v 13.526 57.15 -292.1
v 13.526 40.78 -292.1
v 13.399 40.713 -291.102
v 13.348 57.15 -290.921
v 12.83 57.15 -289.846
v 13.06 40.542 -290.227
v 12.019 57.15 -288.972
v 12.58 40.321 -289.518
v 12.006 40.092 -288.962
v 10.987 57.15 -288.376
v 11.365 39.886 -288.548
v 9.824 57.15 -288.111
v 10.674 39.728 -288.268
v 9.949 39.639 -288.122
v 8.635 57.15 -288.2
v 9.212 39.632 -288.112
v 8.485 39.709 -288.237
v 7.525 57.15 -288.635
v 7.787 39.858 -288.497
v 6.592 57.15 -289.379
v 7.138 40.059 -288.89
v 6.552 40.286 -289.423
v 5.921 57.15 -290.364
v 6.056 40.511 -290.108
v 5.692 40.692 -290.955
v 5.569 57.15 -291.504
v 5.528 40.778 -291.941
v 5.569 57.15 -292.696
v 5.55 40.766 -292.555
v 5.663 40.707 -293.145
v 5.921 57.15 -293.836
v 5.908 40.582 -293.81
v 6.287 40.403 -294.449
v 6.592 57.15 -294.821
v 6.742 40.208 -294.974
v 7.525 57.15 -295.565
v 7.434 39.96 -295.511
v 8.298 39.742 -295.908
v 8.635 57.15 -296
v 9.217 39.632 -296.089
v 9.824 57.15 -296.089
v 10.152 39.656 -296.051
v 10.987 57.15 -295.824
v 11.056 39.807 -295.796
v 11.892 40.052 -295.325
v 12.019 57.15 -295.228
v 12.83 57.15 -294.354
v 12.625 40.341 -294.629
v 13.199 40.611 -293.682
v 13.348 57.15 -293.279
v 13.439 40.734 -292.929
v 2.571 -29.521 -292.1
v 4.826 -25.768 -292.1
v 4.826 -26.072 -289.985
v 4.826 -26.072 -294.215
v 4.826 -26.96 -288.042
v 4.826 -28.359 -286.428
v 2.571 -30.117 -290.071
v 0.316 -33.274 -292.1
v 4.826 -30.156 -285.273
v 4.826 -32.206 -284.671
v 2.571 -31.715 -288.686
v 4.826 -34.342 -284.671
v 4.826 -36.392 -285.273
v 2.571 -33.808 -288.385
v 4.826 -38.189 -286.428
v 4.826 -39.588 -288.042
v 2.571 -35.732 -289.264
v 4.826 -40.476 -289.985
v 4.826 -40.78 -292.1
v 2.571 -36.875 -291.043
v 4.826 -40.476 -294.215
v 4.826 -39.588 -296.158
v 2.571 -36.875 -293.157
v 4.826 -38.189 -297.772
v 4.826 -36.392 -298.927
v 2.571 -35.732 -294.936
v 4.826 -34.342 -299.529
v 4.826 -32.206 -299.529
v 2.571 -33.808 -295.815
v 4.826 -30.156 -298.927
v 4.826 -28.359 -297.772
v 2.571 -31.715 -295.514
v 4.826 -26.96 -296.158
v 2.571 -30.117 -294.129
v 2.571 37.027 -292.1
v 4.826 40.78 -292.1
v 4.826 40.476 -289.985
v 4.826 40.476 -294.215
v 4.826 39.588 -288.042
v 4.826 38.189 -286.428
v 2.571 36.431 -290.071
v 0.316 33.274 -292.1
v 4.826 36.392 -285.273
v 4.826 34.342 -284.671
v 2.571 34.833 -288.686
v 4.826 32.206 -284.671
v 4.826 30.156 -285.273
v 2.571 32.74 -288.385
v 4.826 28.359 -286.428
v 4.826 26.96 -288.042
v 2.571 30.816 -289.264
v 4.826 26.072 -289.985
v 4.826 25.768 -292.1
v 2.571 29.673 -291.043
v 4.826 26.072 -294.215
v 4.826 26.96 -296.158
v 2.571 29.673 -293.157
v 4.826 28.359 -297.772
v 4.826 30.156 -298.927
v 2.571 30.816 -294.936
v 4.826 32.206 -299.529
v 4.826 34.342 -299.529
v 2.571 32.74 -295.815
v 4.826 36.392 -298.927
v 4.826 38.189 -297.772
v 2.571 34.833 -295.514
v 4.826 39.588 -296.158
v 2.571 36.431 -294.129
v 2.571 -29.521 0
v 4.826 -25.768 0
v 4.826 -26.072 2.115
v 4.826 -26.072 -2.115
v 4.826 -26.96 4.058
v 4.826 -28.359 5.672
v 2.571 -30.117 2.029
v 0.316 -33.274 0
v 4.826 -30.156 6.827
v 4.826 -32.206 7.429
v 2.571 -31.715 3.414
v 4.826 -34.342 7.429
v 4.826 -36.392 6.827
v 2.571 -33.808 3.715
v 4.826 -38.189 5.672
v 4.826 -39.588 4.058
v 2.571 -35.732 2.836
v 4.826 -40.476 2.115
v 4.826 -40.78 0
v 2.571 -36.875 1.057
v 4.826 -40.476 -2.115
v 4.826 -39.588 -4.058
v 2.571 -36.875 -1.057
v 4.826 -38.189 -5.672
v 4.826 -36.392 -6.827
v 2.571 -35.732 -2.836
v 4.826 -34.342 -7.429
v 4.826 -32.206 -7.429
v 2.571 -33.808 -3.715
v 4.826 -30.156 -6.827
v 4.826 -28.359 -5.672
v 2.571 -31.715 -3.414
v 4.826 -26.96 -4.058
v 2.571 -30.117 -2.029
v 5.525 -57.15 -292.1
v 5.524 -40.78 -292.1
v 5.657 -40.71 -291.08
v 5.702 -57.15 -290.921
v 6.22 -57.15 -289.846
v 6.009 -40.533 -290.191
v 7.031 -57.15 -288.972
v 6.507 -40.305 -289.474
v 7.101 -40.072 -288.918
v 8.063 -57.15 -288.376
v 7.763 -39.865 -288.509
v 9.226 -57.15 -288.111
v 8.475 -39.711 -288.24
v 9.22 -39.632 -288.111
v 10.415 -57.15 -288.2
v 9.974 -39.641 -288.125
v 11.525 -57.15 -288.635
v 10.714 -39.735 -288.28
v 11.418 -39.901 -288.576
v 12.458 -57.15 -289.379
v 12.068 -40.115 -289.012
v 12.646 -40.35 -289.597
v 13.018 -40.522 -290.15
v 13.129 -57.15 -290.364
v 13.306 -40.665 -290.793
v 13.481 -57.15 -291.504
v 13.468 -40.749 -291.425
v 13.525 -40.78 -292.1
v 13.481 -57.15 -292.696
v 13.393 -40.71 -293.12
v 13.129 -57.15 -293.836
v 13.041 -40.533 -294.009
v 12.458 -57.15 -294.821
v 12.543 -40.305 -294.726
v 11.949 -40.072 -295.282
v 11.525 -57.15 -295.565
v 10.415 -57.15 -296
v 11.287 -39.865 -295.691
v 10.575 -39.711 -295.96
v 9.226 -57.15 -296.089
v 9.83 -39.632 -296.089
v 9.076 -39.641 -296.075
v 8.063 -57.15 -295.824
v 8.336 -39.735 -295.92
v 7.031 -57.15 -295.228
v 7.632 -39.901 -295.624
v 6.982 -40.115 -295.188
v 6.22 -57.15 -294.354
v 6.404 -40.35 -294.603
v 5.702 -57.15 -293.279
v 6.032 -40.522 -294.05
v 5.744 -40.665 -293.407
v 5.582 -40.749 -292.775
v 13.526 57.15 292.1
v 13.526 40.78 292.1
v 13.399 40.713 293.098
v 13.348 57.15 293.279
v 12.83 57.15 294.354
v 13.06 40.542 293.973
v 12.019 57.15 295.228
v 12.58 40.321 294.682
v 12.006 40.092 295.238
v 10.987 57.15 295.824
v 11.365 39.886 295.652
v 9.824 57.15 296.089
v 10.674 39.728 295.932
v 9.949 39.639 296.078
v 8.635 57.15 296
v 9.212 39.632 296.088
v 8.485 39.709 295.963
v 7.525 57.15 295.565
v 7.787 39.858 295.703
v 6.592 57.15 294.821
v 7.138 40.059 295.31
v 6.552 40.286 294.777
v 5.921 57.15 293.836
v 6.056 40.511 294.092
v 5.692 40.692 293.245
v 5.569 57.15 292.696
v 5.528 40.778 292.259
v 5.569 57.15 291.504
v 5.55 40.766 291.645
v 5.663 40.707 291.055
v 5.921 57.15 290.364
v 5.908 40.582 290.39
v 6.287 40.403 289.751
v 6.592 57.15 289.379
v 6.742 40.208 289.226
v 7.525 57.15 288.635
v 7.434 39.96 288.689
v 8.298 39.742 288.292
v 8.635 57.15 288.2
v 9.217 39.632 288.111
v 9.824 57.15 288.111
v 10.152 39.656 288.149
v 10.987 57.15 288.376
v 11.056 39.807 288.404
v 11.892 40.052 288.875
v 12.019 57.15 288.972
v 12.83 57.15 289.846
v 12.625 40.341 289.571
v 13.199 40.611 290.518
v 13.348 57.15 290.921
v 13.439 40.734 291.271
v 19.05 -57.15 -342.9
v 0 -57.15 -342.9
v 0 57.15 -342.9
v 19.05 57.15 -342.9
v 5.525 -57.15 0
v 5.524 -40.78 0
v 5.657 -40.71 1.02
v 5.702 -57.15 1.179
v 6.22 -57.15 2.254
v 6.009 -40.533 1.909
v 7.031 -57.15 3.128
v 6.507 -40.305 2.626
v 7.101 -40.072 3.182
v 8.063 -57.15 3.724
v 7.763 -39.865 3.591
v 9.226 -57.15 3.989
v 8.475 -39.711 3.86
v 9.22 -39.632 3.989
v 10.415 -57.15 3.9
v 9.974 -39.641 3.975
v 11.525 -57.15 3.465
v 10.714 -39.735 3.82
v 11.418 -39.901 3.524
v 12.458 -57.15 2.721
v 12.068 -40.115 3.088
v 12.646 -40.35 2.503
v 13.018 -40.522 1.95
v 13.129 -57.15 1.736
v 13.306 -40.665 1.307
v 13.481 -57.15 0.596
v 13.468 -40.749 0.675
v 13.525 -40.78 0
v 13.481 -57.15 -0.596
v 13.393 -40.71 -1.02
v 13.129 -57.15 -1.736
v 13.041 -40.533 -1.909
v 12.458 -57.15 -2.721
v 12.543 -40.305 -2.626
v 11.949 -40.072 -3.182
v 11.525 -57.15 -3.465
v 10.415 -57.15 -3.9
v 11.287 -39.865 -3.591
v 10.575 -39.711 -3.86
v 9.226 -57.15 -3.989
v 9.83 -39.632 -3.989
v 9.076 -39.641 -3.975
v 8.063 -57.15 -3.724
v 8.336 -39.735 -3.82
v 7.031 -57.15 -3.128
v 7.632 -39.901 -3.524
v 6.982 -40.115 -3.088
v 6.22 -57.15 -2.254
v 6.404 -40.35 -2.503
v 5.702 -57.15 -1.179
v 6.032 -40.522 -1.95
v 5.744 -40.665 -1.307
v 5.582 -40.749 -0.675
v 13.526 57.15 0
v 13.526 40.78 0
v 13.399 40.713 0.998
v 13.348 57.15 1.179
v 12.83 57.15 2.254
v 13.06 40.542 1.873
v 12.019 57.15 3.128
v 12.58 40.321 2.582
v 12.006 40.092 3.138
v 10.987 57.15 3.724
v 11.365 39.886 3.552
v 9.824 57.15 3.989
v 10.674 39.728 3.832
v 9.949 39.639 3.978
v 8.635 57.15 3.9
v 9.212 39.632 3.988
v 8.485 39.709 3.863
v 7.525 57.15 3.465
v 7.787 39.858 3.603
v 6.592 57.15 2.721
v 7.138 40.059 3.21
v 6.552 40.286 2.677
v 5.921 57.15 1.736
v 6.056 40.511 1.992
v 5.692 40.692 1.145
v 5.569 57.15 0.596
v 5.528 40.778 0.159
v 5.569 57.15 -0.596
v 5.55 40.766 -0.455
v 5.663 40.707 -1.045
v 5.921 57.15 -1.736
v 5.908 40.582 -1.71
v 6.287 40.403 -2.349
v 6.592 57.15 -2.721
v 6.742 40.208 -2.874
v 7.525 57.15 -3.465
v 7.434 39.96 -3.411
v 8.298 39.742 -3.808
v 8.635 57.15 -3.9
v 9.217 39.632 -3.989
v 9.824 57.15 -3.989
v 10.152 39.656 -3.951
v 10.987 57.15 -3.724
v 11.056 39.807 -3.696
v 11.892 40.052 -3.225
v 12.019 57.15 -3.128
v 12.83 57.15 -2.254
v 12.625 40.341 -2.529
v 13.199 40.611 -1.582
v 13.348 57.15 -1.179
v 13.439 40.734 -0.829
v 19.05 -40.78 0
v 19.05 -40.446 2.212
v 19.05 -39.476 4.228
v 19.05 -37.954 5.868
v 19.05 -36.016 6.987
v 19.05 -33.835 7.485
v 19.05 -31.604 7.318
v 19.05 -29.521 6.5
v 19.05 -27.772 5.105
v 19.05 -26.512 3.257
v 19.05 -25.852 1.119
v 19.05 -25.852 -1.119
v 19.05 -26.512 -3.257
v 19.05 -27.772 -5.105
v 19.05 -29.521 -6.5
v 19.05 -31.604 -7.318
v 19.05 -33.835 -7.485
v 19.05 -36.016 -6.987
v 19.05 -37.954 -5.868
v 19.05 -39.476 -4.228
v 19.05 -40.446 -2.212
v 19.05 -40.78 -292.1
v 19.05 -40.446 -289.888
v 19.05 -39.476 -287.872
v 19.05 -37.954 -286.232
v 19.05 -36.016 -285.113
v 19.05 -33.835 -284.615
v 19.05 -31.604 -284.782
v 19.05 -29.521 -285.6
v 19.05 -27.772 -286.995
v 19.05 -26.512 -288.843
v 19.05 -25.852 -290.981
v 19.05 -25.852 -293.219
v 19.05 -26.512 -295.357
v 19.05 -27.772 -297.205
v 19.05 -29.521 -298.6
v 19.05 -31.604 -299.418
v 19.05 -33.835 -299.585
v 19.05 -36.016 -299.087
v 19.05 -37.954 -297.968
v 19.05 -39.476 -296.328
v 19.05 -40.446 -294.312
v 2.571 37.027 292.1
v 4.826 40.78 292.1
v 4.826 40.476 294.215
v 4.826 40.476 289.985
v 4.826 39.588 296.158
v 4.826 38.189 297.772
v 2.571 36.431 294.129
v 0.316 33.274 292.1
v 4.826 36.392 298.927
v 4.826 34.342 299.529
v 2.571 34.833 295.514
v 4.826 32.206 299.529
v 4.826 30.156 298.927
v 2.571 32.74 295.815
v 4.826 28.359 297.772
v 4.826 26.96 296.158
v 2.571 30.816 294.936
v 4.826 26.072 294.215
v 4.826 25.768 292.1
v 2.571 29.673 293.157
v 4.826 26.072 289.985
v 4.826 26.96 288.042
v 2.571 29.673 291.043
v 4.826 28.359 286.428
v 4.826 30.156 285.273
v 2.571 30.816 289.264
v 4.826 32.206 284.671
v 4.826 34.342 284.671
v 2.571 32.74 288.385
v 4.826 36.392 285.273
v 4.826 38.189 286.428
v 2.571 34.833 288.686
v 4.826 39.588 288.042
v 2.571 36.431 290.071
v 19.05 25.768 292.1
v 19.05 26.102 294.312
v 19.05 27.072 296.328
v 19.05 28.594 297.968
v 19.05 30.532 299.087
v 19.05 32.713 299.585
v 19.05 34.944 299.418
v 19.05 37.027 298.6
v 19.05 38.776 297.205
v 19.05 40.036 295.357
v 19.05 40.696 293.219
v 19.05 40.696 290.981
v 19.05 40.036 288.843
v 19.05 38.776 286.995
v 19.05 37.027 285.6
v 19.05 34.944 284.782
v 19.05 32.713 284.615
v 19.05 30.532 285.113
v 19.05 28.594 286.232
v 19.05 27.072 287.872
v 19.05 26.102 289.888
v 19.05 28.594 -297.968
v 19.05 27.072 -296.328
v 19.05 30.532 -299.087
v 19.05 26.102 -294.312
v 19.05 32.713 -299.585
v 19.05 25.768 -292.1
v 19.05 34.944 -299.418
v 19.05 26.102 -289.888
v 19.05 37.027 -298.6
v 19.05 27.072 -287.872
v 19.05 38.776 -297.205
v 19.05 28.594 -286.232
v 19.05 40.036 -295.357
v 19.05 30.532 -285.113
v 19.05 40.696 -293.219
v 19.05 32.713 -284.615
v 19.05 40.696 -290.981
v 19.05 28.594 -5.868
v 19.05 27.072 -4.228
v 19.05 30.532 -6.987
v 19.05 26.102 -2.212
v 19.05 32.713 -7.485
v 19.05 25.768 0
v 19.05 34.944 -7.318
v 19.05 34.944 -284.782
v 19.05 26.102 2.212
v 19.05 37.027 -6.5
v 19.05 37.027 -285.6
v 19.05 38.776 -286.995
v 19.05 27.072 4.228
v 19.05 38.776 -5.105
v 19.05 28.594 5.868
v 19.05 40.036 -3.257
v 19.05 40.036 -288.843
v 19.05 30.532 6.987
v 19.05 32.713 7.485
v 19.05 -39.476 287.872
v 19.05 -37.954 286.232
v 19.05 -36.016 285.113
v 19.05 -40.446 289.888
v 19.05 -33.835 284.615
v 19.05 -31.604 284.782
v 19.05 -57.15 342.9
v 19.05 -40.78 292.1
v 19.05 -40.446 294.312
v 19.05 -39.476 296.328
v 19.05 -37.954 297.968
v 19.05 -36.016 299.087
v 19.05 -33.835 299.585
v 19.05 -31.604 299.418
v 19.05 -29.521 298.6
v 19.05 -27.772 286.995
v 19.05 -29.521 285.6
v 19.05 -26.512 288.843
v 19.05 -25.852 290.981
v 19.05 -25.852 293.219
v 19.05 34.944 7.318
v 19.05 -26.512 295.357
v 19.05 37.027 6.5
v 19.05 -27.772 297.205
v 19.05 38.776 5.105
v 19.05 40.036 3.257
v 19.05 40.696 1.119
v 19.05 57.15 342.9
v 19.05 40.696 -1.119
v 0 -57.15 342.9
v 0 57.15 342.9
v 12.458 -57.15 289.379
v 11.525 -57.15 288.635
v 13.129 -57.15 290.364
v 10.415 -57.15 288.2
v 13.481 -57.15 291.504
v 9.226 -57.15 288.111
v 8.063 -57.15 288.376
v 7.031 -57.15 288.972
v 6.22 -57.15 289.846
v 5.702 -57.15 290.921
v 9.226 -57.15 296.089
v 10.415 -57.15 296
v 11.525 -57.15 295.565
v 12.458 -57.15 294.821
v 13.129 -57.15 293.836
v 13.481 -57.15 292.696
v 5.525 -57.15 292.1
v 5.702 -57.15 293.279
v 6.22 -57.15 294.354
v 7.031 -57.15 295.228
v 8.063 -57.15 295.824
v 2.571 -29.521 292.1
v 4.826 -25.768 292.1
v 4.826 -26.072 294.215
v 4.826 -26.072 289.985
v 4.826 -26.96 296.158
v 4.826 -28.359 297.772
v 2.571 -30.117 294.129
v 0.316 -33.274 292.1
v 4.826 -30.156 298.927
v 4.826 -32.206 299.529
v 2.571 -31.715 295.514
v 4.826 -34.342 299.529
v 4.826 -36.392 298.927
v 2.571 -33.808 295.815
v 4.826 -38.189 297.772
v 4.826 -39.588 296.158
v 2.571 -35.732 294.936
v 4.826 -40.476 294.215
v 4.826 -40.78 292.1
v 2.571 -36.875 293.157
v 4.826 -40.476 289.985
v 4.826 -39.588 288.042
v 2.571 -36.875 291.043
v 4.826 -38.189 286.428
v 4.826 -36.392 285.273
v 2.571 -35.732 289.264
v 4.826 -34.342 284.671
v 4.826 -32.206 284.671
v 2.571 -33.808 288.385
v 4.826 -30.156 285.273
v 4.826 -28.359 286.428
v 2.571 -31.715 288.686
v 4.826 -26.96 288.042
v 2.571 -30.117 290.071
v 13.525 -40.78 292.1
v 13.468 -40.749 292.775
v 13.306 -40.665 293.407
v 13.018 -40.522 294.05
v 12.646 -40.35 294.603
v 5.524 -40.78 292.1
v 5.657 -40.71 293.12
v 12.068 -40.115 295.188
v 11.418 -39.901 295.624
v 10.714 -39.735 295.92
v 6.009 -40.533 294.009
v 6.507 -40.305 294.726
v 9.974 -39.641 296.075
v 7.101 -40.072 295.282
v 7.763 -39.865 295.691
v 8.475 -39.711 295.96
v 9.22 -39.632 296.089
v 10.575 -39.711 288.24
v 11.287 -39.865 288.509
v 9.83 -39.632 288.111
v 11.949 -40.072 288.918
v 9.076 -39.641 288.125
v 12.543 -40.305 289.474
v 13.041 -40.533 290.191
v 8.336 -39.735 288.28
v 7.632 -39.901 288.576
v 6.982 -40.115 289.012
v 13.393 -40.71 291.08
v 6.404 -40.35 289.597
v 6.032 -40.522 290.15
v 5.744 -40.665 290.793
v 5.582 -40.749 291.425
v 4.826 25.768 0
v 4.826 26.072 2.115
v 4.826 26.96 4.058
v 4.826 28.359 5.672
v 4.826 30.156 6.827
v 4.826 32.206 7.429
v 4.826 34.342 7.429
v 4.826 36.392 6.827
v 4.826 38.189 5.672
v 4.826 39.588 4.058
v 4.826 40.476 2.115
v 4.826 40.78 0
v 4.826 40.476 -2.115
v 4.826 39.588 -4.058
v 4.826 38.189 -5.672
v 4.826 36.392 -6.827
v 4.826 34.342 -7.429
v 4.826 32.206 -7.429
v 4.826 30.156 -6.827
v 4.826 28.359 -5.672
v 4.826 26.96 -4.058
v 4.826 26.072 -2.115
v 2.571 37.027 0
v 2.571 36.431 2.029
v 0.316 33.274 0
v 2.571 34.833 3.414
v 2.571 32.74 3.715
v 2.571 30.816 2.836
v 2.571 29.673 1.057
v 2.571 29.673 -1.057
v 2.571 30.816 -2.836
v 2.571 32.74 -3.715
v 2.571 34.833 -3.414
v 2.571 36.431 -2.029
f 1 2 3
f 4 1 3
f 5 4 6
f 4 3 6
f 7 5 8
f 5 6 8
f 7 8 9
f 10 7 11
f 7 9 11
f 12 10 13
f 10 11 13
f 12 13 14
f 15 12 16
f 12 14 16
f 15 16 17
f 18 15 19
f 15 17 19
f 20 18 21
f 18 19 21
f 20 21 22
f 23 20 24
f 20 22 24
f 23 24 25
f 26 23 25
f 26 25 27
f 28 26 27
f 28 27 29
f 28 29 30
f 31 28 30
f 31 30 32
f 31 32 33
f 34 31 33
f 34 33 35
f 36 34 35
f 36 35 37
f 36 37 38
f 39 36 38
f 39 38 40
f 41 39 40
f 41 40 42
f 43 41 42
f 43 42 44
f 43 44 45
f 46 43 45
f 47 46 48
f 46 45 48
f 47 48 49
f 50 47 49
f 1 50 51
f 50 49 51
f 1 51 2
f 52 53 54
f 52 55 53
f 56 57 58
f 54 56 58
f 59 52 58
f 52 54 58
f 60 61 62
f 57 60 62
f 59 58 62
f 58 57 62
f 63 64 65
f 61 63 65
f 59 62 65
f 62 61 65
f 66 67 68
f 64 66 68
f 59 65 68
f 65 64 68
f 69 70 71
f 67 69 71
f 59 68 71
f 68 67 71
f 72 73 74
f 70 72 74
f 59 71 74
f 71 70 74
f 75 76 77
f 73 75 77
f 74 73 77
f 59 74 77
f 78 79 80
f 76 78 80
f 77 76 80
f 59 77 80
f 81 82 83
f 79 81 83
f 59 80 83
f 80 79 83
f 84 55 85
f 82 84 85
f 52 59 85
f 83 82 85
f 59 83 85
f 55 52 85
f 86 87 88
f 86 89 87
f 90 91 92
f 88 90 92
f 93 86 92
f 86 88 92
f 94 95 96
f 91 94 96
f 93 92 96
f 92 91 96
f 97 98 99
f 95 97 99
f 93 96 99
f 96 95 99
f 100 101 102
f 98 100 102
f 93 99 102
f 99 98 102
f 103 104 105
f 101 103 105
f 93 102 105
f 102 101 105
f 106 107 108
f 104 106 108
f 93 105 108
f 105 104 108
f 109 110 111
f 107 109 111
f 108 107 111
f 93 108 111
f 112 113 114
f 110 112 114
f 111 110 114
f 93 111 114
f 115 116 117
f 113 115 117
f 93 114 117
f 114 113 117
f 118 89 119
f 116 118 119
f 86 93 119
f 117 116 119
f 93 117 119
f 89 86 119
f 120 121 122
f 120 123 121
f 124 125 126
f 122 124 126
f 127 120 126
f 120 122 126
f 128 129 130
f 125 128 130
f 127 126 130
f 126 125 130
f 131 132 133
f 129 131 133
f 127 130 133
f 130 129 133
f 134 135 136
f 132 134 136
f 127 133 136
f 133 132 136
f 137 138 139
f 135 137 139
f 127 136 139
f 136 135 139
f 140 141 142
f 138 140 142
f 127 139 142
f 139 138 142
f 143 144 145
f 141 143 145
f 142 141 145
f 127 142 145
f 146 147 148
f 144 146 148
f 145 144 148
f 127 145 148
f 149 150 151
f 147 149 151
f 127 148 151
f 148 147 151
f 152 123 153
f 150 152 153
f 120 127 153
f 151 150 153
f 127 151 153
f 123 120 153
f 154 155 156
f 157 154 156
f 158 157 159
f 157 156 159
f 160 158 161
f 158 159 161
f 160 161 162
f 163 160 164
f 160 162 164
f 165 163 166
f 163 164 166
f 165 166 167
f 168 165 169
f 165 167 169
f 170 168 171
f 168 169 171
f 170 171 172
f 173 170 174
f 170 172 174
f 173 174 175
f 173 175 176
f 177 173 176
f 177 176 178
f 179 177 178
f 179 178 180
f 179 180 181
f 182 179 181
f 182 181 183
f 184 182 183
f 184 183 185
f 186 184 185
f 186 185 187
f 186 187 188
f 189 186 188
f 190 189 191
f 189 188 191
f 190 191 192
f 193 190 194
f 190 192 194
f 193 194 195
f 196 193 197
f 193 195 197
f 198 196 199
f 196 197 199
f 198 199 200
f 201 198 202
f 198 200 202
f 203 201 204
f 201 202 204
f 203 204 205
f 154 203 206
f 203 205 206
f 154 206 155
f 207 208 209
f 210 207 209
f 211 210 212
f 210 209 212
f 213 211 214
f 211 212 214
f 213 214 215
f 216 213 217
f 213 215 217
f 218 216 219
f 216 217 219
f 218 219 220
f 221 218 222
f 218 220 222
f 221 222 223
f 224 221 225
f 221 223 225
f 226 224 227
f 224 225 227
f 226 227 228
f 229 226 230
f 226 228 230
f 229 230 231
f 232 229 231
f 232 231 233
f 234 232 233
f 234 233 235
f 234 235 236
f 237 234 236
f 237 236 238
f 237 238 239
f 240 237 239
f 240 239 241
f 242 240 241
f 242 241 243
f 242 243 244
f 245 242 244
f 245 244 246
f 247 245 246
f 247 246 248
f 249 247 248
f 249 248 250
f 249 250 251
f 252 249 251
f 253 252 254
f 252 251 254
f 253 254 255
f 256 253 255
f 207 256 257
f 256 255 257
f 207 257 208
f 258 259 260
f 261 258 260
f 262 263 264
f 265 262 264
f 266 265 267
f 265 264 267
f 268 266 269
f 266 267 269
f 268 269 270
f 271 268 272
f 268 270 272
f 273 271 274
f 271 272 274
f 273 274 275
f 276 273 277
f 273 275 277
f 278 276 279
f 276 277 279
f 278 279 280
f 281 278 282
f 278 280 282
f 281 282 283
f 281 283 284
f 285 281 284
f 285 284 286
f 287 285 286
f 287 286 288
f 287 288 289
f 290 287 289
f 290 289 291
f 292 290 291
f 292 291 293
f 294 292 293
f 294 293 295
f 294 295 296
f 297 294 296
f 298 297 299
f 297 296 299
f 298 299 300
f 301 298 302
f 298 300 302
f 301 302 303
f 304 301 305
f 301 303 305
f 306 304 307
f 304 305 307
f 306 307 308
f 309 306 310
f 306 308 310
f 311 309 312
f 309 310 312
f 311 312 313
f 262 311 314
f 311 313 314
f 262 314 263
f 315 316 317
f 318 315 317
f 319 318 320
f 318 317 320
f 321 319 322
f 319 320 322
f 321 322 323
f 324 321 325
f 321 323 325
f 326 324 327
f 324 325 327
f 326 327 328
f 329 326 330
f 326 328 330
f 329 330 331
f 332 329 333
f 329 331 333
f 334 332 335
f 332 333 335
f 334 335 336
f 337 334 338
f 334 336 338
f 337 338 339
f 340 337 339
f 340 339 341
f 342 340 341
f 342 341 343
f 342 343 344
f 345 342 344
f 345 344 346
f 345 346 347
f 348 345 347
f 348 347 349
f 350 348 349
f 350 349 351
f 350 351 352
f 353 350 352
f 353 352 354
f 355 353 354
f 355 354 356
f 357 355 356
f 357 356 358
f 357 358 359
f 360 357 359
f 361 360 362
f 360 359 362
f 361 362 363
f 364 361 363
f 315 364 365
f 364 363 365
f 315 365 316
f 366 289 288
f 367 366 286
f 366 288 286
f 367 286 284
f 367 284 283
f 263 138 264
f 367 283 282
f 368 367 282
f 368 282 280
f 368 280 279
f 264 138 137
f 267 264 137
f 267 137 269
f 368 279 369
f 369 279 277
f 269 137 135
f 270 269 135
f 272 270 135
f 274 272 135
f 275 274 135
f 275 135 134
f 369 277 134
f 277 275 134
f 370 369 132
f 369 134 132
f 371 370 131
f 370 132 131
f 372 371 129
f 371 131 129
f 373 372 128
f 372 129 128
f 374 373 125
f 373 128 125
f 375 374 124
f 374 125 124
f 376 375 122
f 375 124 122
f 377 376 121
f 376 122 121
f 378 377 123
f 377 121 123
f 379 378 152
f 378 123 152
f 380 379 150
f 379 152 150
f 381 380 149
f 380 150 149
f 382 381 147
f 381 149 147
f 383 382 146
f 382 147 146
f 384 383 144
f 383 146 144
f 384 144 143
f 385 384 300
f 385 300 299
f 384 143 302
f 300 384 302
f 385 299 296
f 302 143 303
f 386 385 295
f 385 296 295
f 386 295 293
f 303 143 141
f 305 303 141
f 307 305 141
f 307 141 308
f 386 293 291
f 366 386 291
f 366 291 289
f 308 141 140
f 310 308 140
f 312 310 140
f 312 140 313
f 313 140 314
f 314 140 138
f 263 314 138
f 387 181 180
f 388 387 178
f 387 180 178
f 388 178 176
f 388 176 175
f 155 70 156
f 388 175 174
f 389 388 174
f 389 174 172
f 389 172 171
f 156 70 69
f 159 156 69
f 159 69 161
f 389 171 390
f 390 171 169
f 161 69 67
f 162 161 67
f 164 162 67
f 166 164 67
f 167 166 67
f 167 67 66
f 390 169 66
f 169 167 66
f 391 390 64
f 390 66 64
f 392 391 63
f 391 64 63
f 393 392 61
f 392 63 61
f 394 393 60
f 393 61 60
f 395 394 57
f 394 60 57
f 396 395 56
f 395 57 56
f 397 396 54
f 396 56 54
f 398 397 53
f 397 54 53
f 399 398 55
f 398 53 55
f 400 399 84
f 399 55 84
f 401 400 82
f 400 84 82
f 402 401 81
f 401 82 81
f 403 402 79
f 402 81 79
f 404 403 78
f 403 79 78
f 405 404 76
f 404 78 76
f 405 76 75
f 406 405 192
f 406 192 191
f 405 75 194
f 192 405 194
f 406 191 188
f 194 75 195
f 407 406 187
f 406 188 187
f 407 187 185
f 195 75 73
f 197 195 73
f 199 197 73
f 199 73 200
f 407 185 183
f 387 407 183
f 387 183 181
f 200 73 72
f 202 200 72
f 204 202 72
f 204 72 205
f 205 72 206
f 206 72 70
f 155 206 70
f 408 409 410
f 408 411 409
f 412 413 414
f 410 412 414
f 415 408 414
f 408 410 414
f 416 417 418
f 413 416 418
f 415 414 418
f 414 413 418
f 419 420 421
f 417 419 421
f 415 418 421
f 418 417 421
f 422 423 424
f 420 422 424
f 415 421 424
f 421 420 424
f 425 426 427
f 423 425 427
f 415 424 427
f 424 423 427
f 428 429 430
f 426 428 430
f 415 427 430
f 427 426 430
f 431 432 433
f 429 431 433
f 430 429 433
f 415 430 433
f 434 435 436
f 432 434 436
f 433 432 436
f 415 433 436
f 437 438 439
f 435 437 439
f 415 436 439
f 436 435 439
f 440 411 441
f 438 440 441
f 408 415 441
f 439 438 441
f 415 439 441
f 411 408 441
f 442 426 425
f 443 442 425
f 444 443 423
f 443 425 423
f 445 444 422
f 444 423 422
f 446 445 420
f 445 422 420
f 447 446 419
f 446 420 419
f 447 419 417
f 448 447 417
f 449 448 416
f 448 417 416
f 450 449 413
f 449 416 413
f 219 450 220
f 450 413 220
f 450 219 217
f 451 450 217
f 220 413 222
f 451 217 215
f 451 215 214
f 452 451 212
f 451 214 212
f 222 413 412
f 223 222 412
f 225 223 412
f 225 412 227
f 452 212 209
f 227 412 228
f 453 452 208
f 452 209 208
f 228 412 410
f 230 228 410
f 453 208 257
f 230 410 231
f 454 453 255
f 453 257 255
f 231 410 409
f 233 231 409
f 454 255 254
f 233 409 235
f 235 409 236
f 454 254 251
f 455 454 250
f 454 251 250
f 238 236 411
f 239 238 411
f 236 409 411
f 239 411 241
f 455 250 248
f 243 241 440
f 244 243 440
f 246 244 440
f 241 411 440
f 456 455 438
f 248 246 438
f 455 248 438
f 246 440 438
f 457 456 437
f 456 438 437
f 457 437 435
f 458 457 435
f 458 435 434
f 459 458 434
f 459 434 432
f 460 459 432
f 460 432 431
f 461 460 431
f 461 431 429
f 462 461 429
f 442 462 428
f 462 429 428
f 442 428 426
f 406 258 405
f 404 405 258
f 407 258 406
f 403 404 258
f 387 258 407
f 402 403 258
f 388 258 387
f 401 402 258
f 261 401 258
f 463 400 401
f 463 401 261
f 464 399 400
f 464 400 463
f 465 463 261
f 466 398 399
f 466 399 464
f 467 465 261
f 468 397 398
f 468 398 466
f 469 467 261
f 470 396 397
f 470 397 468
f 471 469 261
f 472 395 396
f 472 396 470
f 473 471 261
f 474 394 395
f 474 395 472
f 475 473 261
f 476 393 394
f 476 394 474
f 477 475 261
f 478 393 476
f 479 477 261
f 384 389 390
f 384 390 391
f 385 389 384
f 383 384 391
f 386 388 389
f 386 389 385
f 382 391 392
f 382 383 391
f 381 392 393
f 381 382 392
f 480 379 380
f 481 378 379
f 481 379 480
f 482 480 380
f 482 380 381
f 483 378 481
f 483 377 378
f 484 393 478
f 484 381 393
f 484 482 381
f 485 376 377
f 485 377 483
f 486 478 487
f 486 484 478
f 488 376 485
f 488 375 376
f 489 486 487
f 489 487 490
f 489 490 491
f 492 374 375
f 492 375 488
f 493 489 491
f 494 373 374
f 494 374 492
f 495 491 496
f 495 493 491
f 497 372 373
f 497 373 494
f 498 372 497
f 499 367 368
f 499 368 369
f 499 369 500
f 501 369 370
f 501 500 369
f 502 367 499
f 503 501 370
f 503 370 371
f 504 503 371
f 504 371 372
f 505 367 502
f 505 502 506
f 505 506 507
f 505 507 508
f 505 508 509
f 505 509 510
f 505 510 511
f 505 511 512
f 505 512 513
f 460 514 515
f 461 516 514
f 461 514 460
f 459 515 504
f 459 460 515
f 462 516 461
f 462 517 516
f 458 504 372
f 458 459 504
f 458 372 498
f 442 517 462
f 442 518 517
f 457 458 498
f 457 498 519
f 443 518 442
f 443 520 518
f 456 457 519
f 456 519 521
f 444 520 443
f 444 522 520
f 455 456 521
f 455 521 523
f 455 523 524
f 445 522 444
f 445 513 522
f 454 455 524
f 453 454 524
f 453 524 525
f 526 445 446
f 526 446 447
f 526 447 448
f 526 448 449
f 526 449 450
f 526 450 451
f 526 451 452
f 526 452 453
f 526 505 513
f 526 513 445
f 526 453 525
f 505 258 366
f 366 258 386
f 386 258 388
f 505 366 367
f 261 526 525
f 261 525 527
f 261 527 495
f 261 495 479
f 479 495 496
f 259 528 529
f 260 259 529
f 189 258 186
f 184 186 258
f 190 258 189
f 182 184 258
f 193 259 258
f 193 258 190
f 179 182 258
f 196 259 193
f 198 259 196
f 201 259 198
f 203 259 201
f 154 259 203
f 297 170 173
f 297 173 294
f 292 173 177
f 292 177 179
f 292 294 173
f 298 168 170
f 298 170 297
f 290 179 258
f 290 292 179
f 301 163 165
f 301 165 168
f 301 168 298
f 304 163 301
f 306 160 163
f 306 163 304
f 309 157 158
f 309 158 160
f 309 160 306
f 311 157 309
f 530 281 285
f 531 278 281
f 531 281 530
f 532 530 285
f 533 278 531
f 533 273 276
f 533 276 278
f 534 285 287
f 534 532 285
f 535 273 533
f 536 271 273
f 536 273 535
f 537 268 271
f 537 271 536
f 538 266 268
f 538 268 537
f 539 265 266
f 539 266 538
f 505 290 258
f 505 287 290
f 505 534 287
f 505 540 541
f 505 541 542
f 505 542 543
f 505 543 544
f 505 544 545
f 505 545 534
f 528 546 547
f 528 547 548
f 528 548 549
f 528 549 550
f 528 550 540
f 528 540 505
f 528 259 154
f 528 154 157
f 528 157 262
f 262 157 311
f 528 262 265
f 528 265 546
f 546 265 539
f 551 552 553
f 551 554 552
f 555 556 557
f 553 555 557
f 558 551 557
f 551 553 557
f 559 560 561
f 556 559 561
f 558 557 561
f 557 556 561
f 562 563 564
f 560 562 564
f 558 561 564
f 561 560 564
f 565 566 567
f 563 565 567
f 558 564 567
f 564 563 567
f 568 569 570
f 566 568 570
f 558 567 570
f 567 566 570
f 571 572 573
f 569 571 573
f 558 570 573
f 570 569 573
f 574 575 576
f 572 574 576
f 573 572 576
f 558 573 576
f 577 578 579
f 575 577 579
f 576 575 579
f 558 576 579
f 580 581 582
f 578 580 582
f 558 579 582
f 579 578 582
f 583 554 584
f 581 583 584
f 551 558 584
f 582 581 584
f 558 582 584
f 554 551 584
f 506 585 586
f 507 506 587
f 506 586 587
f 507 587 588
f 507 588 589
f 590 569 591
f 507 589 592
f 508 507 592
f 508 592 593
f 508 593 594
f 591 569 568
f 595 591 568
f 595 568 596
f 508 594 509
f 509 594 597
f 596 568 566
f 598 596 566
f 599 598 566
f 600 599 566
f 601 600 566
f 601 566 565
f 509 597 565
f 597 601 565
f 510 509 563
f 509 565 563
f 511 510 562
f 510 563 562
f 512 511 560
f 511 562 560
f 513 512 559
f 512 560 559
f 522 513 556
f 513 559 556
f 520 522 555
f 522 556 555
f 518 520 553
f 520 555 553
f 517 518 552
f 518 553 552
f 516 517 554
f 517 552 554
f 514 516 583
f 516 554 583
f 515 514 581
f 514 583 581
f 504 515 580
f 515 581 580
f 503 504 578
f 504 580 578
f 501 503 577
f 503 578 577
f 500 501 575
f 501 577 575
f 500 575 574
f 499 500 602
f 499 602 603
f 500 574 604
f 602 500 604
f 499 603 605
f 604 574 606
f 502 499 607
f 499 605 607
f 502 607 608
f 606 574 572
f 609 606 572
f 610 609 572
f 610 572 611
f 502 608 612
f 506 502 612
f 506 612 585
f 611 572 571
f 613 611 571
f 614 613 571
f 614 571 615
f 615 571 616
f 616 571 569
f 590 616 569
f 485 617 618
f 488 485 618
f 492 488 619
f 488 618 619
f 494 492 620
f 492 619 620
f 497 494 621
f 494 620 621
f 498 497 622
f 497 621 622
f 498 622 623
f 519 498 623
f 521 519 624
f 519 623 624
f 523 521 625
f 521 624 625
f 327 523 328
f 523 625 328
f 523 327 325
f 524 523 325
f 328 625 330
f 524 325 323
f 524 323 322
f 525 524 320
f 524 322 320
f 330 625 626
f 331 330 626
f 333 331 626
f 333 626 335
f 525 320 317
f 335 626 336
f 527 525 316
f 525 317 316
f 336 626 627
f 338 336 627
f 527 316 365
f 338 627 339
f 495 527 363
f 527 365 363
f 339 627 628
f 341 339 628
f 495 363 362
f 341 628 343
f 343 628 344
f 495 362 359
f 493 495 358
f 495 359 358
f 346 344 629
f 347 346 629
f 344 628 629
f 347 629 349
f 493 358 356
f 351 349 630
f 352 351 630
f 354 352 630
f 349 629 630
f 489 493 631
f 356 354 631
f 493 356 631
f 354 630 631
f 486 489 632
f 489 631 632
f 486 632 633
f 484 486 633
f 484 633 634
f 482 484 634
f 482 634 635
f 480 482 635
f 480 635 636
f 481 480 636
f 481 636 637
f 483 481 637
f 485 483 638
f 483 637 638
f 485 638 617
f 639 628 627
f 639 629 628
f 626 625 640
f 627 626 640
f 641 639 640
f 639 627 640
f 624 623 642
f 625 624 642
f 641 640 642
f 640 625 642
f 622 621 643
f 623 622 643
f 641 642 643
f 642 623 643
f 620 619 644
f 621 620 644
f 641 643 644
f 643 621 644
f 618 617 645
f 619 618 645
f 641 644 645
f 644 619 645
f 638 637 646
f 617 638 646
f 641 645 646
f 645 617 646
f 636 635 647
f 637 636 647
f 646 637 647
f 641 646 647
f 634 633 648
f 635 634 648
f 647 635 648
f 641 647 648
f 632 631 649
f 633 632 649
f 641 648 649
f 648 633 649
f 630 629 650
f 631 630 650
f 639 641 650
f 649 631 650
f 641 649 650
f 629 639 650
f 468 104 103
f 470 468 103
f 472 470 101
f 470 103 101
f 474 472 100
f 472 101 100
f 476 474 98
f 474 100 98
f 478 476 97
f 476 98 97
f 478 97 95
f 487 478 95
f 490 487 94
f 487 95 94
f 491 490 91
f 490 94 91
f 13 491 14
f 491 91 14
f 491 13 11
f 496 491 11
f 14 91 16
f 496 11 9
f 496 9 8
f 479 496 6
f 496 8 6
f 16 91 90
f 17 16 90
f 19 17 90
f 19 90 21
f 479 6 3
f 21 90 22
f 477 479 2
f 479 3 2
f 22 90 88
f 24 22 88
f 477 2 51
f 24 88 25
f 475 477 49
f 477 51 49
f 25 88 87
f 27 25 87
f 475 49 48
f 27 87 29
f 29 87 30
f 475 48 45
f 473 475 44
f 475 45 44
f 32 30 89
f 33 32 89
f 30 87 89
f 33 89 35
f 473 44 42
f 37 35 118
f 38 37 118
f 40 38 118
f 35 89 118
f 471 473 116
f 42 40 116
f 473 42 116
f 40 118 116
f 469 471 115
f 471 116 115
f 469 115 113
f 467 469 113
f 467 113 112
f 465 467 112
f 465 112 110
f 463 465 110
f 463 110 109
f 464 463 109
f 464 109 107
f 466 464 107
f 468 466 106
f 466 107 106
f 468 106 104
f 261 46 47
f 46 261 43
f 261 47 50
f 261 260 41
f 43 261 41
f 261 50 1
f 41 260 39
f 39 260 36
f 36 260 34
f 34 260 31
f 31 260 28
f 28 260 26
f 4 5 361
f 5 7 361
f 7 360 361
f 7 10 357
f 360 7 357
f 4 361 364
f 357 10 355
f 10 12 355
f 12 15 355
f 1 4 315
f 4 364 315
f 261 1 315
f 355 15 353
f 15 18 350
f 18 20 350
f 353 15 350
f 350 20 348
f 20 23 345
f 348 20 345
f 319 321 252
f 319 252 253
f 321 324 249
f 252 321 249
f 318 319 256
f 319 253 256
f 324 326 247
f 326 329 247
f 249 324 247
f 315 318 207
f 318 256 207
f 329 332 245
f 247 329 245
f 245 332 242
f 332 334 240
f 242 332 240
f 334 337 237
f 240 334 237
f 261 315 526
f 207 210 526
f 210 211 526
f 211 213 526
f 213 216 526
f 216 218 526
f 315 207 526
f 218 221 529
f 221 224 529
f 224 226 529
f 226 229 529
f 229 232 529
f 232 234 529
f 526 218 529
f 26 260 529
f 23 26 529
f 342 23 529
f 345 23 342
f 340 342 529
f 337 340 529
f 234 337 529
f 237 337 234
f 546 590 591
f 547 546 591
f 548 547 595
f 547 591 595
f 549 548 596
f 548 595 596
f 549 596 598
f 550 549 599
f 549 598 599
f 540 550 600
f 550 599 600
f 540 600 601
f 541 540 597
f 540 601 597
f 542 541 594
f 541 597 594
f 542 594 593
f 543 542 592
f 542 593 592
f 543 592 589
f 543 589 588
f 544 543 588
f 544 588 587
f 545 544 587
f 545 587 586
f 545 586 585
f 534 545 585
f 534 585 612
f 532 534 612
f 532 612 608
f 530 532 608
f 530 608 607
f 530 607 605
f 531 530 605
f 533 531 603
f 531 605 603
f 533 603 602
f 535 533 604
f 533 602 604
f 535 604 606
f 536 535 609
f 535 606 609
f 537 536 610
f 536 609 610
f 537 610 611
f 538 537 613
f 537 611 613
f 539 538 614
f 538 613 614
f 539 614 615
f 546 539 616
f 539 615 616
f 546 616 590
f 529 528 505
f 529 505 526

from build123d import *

# Parameters (mm, degrees)
F0_W     = 114.3
F0_H     = 685.8
F1_DEPTH = 19.05
F3_D     = 15.0114
F3_DEPTH = 14.224
F3_TIP   = 4.5098795482
F5_D     = 8.001
F5_DEPTH = 25.4
F5_TIP   = 2.4037429064
F7_D     = 8.001
F7_DEPTH = 25.4
F7_TIP   = 2.4037429064


with BuildPart() as f1:
    # F0 (on Right) → F1 (new body)
    with BuildSketch(Plane.YZ):
        Rectangle(F0_W, F0_H)
    extrude(amount=F1_DEPTH)

    # F3
    with Locations(Plane.YZ.offset(19.05)):
        with Locations((-33.274, 292.1), (33.274, 292.1), (-33.274, 0), (33.274, 0), (33.274, -292.1), (-33.274, -292.1)):
            Hole(F3_D / 2, depth=F3_DEPTH)
            with Locations((0, 0, -(F3_DEPTH + F3_TIP / 2))):  # 118° drill point
                Cone(0, F3_D / 2, F3_TIP, mode=Mode.SUBTRACT)

    # F5
    with Locations(Plane(origin=(0, 57.15, 0), x_dir=(-1, 0, 0), z_dir=(0, 1, 0))):
        with Locations((-9.525, -292.1), (-9.525, 292.1), (-9.525, 0)):
            Hole(F5_D / 2, depth=F5_DEPTH)
            with Locations((0, 0, -(F5_DEPTH + F5_TIP / 2))):  # 118° drill point
                Cone(0, F5_D / 2, F5_TIP, mode=Mode.SUBTRACT)

    # F7
    with Locations(Plane.XZ.offset(57.15)):
        with Locations((9.525, 292.1), (9.525, 0), (9.525, -292.1)):
            Hole(F7_D / 2, depth=F7_DEPTH)
            with Locations((0, 0, -(F7_DEPTH + F7_TIP / 2))):  # 118° drill point
                Cone(0, F7_D / 2, F7_TIP, mode=Mode.SUBTRACT)


solid = f1.part
